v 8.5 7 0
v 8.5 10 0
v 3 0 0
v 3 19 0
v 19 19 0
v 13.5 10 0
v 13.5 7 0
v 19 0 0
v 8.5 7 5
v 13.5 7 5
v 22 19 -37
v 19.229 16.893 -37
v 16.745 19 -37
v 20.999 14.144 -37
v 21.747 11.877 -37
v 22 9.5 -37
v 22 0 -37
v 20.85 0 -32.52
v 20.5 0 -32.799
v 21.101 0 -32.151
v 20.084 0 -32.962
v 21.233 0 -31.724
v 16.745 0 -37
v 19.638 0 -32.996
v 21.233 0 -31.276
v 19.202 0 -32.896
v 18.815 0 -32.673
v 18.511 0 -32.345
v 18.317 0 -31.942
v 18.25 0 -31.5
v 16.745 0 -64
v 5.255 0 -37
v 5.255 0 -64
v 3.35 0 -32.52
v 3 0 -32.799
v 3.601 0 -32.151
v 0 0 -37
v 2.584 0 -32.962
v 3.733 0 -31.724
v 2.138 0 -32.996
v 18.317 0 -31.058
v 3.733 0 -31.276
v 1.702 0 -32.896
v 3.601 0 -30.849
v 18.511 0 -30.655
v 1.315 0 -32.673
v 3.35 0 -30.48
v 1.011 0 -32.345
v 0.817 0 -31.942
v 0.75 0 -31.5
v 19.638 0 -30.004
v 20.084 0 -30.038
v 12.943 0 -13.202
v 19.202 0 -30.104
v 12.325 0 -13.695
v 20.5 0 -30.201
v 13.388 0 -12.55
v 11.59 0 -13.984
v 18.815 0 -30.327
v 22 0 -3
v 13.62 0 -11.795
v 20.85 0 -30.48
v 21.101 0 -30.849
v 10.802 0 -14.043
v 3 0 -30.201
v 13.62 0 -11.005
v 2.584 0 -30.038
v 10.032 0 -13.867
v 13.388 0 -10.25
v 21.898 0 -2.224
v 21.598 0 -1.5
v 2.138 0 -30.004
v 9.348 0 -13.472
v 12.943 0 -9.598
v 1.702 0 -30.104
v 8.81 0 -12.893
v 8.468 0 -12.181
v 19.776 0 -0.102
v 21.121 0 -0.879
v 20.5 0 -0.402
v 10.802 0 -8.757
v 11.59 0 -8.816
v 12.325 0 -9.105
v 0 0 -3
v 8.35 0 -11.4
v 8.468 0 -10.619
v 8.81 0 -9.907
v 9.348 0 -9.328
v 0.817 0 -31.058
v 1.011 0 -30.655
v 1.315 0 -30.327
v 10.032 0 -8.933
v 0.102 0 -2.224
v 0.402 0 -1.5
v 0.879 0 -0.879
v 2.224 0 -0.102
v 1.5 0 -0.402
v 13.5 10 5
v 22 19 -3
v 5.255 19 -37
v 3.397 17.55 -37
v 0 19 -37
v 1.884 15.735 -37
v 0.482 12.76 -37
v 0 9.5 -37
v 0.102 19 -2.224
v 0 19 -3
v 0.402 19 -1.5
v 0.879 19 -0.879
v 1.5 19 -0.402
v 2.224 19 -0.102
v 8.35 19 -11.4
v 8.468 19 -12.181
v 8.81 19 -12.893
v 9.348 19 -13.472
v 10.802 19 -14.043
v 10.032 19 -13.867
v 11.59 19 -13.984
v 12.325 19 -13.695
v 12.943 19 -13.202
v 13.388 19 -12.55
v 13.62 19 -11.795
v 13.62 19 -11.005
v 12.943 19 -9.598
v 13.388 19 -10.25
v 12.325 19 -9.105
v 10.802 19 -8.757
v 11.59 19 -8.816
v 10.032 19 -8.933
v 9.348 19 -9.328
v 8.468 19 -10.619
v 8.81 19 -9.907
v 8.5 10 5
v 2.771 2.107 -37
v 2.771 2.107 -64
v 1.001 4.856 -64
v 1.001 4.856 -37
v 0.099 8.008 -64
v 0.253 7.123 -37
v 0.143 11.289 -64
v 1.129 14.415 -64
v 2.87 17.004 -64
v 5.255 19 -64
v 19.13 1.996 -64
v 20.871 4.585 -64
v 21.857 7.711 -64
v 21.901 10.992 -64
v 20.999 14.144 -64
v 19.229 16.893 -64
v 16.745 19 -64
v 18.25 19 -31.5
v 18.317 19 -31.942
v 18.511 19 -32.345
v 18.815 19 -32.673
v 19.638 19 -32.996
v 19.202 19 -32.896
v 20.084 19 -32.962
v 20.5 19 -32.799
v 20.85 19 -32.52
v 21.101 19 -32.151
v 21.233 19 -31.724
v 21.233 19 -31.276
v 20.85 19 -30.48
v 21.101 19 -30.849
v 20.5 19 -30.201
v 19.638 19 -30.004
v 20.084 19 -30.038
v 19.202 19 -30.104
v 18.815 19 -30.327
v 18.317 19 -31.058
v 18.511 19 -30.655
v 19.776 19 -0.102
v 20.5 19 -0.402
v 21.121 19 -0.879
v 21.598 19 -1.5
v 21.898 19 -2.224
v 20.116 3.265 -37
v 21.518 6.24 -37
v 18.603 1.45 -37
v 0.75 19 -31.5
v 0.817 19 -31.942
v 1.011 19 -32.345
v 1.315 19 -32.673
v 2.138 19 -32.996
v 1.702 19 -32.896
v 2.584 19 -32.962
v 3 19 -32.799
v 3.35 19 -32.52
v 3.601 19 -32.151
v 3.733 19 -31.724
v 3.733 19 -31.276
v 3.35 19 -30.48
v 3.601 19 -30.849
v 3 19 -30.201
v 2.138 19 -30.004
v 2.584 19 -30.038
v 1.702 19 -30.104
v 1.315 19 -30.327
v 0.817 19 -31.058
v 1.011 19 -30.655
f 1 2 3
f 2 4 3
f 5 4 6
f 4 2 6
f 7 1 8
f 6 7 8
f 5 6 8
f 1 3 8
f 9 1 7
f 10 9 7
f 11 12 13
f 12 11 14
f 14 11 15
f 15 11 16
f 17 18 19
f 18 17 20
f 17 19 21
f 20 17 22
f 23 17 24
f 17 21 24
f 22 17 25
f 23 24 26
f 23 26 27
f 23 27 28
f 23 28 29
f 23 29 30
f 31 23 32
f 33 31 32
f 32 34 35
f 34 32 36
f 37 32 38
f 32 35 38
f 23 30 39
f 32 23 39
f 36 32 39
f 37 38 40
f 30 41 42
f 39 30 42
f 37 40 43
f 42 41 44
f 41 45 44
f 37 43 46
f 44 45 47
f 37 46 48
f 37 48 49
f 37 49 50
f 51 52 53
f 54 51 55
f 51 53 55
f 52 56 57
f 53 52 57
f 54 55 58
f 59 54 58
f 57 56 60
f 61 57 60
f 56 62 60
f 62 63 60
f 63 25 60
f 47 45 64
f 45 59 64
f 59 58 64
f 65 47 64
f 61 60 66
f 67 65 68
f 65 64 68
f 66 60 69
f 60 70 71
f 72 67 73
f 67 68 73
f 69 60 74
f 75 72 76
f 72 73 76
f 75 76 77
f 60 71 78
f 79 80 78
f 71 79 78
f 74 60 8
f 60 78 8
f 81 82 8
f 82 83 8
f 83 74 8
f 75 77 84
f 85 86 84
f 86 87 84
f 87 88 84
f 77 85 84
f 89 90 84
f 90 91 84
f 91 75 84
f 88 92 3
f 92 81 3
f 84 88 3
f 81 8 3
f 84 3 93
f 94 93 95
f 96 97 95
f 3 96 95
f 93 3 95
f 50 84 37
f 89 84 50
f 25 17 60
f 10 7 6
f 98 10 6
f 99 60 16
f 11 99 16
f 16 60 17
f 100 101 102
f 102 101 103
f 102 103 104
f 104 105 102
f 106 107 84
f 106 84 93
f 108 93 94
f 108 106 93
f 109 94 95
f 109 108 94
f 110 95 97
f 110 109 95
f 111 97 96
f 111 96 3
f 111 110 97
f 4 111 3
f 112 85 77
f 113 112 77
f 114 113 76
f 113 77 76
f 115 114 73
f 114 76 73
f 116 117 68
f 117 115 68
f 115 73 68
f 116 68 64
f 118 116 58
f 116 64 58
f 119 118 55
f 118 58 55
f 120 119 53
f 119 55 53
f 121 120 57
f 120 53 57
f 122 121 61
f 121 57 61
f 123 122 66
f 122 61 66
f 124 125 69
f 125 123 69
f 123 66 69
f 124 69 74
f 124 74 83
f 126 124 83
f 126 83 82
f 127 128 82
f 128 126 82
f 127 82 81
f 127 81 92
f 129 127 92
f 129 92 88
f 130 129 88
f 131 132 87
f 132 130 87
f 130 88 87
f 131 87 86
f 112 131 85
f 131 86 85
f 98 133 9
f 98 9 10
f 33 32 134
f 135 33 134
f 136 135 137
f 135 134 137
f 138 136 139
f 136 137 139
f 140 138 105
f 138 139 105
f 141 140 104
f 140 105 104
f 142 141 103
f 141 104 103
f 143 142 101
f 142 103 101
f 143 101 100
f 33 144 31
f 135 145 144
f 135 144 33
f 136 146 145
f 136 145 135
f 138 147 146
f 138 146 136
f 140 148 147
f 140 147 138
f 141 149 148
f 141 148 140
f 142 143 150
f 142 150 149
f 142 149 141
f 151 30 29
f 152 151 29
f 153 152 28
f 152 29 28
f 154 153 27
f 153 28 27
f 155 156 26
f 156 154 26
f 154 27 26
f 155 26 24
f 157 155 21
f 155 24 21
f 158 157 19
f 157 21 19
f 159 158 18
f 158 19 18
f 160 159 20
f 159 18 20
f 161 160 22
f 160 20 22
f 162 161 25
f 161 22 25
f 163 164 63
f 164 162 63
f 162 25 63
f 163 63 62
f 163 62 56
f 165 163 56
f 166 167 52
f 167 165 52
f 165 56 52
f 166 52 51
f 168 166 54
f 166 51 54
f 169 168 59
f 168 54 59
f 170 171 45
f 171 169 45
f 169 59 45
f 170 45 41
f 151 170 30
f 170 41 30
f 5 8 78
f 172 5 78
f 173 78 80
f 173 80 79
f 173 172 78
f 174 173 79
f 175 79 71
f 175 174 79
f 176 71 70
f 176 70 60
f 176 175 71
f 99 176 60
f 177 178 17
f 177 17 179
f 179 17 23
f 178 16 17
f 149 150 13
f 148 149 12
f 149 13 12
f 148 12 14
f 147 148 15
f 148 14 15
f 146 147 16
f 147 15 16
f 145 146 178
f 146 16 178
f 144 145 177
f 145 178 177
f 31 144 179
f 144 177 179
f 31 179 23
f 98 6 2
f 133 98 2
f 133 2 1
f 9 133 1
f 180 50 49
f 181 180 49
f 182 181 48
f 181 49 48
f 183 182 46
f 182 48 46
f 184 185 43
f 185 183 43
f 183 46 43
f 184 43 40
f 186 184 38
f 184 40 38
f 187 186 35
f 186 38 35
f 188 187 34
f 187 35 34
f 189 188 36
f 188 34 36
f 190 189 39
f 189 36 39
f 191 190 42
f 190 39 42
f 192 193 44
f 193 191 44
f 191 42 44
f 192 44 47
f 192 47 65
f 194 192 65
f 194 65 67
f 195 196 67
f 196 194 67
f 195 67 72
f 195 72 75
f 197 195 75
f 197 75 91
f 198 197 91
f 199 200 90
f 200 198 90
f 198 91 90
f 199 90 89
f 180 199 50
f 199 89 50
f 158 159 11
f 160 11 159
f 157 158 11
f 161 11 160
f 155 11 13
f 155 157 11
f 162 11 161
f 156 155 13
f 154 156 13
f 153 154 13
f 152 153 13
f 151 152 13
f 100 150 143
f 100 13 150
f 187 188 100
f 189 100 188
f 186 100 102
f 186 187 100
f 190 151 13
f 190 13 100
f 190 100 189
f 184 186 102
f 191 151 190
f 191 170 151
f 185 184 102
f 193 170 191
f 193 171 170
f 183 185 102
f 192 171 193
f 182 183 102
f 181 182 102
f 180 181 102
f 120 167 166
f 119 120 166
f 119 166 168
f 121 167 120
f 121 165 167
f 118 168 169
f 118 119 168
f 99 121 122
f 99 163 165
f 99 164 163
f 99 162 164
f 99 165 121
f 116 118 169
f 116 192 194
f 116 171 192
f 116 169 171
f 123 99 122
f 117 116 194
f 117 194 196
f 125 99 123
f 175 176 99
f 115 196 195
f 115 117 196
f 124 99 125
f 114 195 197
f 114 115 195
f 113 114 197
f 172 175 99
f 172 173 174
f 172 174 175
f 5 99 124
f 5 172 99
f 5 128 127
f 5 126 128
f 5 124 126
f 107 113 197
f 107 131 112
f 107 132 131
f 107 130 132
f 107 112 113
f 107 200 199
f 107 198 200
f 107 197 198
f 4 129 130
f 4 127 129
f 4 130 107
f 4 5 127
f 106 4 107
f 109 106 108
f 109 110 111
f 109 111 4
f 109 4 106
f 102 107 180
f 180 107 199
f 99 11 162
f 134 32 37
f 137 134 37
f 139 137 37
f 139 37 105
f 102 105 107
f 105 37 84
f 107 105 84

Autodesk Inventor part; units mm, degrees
ref_plane "YZ Plane" through (0, 0, 0) normal (1, 0, 0) x (0, 1, 0)
ref_plane "XZ Plane" through (0, 0, 0) normal (0, 1, 0) x (-1, 0, 0)
ref_plane "XY Plane" through (0, 0, 0) normal (0, 0, 1) x (1, 0, 0)
sketch "Sketch1" plane through (0, 0, 0) normal (0, 1, 0) x (-1, 0, 0)
  line L0 (0, 0) -> (-22, 0)
  line L1 (-22, 0) -> (-22, -37)
  line L2 (-22, -37) -> (0, -37)
  line L3 (0, -37) -> (0, 0)
  line L4 (-11, -37) -> (-11, 0) construction
  circle A0 centre (-11, -11.4) radius 2.65
  circle A1 centre (-19.75, -31.5) radius 1.5
  circle A2 centre (-2.25, -31.5) radius 1.5
  dimension "gearboxWidth" = 22
  dimension "gearboxLength" = 37
  dimension "shaftDiameter" = 5.3
  dimension "shaftCenterToBottom" = 11.4
  dimension "mountHolesDiameter" = 3
  dimension "mountHolesCenterToCenter" = 17.5
  dimension "mountHolesCenterToEdge" = 5.5
extrude "Extrusion1" add sketch "Sketch1" along normal blind 19
sketch "Sketch2" plane through (22, 0, -37) normal (0, 0, -1) x (-1, 0, 0)
  line L0 (0, 19) -> (22, 19) projected
  line L1 (11, 19) -> (11, 0) construction
  line L2 (0, 0) -> (22, 0) projected
  ellipse E0 centre (11, 9.5) end of major axis (22, 9.5) minor radius 11.1399 (16.7448, 0) -> (16.7448, 19) ccw
  ellipse E1 centre (11, 9.5) end of major axis (22, 9.5) minor radius 11.1399 (5.2552, 19) -> (5.2552, 0) ccw
  line L3 (5.2552, 19) -> (16.7448, 19)
  line L4 (5.2552, 0) -> (16.7448, 0)
extrude "Extrusion2" add sketch "Sketch2" along normal blind 27
fillet "Fillet1" radius 3 2 edges at (0, 9.5, 0) (22, 9.5, 0)
sketch "Sketch3" plane through (0, 0, 0) normal (0, 0, 1) x (1, 0, 0)
  line L0 (0, 0) -> (22, 0) projected
  line L1 (16.7448, 0) -> (5.2552, 0) projected
  line L2 (11, 0) -> (11, 18.9763) construction
  line L3 (8.5, 10) -> (8.5, 7)
  line L4 (8.5, 7) -> (13.5, 7)
  line L5 (13.5, 7) -> (13.5, 10)
  line L6 (13.5, 10) -> (8.5, 10)
  line L7 (8.5, 10) -> (13.5, 7) construction
  line L8 (8.5, 7) -> (13.5, 10) construction
  point P0 (11, 8.5)
  dimension "gearboxTabWidth" = 5
  dimension "gearboxTabHeight" = 3
  dimension "gearboxTabOffsetFromBottom" = 7
extrude "Extrusion3" add sketch "Sketch3" along normal blind 5
properties part number "Yellow_Motor"
